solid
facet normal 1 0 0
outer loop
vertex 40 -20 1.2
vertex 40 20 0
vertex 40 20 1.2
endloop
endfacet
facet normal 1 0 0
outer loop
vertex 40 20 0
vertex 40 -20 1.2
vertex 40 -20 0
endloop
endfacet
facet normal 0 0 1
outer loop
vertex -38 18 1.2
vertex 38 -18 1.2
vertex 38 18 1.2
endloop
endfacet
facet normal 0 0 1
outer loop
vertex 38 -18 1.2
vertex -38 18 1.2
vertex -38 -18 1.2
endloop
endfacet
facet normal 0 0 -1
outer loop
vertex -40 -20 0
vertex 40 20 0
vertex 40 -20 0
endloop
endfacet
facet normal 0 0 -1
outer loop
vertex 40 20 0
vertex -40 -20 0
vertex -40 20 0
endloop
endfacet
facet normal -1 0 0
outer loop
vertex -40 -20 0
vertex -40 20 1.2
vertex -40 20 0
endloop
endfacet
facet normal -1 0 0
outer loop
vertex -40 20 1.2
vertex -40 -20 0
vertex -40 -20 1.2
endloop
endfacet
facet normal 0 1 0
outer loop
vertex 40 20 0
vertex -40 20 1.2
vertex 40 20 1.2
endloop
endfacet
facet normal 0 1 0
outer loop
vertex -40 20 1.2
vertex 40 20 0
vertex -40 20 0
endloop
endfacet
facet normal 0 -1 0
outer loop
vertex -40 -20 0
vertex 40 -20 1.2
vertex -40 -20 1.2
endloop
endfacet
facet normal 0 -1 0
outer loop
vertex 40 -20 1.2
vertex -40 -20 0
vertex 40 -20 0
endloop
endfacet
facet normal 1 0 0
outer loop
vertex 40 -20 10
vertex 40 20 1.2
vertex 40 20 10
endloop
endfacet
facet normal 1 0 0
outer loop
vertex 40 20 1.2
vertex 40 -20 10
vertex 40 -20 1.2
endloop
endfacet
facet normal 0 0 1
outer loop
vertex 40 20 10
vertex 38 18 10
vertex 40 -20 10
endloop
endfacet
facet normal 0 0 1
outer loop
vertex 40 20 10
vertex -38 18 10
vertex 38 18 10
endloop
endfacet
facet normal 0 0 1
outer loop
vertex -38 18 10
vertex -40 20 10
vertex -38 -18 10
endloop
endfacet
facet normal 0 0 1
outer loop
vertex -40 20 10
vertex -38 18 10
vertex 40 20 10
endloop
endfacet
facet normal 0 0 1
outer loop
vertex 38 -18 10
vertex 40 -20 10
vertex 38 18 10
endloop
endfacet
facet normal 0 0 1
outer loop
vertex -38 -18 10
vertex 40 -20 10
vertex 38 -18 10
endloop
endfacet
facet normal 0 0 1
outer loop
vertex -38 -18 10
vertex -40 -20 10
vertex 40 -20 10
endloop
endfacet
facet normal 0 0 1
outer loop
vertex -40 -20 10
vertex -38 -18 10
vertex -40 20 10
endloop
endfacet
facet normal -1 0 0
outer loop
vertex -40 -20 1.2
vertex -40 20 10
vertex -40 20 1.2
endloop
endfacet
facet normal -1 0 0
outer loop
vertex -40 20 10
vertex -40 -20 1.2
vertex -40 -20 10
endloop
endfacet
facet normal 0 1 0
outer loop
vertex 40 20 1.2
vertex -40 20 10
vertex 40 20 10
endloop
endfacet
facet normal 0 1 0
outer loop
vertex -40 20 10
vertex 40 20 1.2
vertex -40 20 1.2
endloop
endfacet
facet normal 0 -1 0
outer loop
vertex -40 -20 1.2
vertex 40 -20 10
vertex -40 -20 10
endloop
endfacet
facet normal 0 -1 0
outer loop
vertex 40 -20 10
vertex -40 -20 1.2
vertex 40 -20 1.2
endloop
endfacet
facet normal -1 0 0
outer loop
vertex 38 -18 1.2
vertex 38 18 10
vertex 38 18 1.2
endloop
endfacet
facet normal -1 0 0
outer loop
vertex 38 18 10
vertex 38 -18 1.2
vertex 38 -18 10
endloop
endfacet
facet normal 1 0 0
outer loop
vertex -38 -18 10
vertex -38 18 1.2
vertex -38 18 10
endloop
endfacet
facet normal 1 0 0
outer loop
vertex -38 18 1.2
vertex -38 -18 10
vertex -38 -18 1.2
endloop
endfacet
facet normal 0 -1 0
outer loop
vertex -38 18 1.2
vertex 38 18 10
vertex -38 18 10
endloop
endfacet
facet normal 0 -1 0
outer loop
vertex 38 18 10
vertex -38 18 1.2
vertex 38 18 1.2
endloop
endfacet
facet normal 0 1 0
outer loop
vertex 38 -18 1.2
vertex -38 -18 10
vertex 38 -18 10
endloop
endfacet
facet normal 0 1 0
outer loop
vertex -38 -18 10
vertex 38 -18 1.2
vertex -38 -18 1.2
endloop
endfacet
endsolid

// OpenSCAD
scale([0.2, 0.2, 1]){
	difference(){
		union(){
			translate([0, 0, 100.7])
				scale([1, 1, 1])
					surface("matterhornSilhoutte.png", invert=true, center=true);
			translate([0, 0, 0.6])
				cube([400, 200, 1.2], center=true);
		}
		#translate([0, 0, 54])
			cube([400, 200, 100], center=true);
	}
}


translate([0, 0, 5])
	difference(){
		cube([80, 40, 10], center=true);
		cube([80-4, 40-4, 10], center=true);
	}
